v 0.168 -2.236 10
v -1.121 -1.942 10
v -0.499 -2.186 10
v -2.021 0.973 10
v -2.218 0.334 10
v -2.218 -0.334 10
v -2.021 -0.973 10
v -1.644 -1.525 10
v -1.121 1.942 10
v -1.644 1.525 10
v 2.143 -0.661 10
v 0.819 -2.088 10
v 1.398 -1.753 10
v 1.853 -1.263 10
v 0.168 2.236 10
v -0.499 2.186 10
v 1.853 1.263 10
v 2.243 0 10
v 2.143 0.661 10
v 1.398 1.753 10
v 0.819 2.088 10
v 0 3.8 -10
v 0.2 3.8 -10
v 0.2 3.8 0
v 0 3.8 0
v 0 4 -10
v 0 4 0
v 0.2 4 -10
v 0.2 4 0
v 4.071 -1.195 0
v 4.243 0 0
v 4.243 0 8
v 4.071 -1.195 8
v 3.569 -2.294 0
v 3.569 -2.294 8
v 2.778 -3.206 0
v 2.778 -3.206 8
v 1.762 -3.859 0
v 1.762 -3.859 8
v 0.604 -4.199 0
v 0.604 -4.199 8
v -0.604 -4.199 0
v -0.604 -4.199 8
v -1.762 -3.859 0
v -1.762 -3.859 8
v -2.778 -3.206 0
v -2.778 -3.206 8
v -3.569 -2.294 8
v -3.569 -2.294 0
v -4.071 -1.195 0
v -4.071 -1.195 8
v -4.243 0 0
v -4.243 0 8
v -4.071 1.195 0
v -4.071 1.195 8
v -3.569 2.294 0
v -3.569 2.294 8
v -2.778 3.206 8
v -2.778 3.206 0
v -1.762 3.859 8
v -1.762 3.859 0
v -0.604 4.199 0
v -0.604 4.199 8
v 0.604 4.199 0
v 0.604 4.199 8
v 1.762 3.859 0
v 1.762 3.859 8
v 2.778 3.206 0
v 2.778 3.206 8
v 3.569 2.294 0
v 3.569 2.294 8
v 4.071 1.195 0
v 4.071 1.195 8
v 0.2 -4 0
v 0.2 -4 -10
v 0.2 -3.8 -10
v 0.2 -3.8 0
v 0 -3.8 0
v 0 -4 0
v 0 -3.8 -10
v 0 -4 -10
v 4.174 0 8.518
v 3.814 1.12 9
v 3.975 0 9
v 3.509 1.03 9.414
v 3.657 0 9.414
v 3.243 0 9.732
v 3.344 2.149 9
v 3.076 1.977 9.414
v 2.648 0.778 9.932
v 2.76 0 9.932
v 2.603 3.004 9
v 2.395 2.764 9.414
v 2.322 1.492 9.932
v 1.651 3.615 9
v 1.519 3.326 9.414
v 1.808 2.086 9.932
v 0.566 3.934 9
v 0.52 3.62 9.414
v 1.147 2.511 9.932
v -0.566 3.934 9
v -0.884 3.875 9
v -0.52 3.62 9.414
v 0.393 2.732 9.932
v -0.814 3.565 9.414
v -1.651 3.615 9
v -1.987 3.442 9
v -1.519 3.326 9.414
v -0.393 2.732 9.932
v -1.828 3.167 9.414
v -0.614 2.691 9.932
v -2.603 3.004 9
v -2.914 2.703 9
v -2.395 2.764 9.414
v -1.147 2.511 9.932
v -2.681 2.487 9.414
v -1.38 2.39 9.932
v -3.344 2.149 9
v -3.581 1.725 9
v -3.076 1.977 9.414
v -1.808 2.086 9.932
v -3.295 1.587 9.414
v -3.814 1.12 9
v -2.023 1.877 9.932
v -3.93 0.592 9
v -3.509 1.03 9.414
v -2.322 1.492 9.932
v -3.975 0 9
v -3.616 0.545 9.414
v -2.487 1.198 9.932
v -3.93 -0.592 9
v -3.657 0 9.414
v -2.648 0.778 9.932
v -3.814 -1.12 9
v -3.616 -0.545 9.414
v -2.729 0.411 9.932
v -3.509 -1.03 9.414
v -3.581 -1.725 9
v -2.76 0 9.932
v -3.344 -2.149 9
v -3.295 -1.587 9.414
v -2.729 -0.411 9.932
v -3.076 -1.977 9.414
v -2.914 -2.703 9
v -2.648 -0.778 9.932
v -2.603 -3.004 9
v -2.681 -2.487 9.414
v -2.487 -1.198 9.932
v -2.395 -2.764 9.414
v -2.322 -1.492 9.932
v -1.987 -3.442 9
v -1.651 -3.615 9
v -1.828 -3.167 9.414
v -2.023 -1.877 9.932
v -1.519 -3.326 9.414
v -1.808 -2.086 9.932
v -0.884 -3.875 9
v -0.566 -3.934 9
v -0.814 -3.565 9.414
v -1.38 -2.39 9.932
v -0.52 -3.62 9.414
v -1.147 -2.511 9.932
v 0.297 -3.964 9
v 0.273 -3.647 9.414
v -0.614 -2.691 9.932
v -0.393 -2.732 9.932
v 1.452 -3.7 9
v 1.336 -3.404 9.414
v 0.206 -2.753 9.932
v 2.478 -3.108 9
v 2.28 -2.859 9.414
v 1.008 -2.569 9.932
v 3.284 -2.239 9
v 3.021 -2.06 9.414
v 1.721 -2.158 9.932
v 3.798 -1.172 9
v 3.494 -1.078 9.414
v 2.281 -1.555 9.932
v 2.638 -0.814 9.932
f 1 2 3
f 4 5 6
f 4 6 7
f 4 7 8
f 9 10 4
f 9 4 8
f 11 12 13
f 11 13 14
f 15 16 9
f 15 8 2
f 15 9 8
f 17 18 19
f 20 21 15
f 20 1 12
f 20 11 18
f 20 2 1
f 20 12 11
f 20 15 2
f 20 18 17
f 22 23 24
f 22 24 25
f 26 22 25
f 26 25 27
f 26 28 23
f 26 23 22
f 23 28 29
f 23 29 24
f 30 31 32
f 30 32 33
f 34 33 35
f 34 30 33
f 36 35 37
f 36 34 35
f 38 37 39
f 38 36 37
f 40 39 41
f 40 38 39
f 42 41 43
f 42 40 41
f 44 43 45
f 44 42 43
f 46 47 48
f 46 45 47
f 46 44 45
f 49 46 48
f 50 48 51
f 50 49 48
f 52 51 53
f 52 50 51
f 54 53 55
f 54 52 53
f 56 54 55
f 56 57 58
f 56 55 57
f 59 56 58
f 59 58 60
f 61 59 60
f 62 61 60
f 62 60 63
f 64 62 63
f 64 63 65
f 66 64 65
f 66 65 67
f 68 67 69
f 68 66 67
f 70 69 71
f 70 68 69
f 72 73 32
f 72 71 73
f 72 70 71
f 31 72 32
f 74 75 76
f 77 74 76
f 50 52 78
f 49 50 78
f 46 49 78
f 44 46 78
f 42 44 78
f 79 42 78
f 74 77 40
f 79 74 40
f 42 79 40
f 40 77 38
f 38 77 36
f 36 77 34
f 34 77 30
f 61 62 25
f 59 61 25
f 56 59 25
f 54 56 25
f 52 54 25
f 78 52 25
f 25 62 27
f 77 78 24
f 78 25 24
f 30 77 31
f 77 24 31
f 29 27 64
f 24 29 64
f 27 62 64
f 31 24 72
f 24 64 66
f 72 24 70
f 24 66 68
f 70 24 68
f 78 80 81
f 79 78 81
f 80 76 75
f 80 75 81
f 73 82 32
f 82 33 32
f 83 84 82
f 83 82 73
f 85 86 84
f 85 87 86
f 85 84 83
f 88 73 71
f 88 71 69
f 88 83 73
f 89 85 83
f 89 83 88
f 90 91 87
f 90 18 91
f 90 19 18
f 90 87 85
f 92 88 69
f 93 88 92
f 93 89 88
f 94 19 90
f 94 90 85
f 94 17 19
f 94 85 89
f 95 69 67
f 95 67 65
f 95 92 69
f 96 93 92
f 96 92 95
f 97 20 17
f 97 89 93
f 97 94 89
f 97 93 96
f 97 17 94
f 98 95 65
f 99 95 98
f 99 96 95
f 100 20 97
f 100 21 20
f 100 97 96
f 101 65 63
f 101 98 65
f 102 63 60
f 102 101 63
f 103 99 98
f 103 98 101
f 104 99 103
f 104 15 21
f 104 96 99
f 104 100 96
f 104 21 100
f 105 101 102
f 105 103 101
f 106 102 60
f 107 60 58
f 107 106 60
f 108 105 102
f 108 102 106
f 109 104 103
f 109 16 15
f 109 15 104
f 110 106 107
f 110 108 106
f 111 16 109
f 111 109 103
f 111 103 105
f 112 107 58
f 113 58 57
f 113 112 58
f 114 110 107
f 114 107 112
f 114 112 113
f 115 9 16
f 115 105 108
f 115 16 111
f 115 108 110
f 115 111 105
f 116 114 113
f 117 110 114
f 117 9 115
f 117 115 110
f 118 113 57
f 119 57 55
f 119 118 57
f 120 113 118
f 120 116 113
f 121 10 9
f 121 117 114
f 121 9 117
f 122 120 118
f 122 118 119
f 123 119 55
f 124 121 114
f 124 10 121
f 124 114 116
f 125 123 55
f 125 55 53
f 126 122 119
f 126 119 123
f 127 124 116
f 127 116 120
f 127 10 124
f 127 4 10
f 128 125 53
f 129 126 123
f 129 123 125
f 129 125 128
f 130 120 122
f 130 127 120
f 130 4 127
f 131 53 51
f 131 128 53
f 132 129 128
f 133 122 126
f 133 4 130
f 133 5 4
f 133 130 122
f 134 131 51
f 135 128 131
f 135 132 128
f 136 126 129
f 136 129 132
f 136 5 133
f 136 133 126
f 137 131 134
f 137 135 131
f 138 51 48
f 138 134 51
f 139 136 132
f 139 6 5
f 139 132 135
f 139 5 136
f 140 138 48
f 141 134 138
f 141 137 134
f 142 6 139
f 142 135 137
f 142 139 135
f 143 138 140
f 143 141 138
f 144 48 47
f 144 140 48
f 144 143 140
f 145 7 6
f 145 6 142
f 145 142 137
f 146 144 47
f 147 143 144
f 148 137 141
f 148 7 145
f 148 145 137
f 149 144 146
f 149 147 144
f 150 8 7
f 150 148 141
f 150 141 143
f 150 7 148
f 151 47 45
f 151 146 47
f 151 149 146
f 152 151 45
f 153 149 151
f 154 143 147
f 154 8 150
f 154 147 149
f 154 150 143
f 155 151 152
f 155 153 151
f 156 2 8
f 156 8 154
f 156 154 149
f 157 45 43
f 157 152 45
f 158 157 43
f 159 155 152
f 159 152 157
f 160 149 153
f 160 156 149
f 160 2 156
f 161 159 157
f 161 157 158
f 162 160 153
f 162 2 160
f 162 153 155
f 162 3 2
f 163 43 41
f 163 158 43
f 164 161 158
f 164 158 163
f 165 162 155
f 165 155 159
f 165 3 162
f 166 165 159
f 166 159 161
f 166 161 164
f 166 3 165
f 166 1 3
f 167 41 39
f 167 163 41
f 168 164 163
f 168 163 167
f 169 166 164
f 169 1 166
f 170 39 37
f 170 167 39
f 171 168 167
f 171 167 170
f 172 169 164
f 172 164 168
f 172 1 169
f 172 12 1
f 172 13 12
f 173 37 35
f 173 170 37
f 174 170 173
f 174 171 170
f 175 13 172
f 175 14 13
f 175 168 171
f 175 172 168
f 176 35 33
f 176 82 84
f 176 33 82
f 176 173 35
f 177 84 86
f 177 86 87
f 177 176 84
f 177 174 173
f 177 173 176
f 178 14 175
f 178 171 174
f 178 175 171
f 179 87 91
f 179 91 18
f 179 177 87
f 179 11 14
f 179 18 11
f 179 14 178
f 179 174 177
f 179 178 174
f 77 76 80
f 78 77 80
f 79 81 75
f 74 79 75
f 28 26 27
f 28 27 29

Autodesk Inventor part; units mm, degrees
ref_plane "YZ Plane" through (0, 0, 0) normal (1, 0, 0) x (0, 1, 0)
ref_plane "XZ Plane" through (0, 0, 0) normal (0, 1, 0) x (-1, 0, 0)
ref_plane "XY Plane" through (0, 0, 0) normal (0, 0, 1) x (1, 0, 0)
sketch "Sketch1" plane through (0, 0, 0) normal (0, 0, 1) x (1, 0, 0)
  circle A0 centre (0, 0) radius 4.2426
extrude "Extrusion1" add sketch "Sketch1" along normal blind 10
fillet "Fillet1" radius 2 1 edges at (-4.2426, 0, 10)
sketch "Sketch2" plane through (0, 0, 0) normal (0, 0, -1) x (-1, 0, 0)
  line L0 (0, -4) -> (-0.2, -4)
  line L1 (-0.2, -4) -> (-0.2, -3.8)
  line L2 (-0.2, -3.8) -> (0, -3.8)
  line L3 (0, -3.8) -> (0, -4)
  line L4 (0, 4) -> (-0.2, 4)
  line L5 (-0.2, 4) -> (-0.2, 3.8)
  line L6 (-0.2, 3.8) -> (0, 3.8)
  line L7 (0, 3.8) -> (0, 4)
  point P0 (0, 0)
  dimension "d3" = 0.2
  dimension "d4" = 0.2
  dimension "d5" = 0.2
  dimension "d6" = 0.2
extrude "Extrusion2" add sketch "Sketch2" along normal blind 10 contours L0 L1 L2 L3
sketch "Sketch3" plane through (0, 0, 0) normal (0, 0, -1) x (-1, 0, 0)
  point P0 (0, 0)
sketch "Sketch4" plane through (0, 0, 0) normal (0, 0, -1) x (-1, 0, 0)
  line L0 (0, 4) -> (-0.2, 4)
  line L1 (-0.2, 4) -> (-0.2, 3.8)
  line L2 (-0.2, 3.8) -> (0, 3.8)
  line L3 (0, 3.8) -> (0, 4)
  point P0 (0, 0)
  dimension "d9" = 0.2
  dimension "d10" = 0.2
extrude "Extrusion3" add sketch "Sketch4" along normal blind 10
properties part number "bulb" material "Glass"
